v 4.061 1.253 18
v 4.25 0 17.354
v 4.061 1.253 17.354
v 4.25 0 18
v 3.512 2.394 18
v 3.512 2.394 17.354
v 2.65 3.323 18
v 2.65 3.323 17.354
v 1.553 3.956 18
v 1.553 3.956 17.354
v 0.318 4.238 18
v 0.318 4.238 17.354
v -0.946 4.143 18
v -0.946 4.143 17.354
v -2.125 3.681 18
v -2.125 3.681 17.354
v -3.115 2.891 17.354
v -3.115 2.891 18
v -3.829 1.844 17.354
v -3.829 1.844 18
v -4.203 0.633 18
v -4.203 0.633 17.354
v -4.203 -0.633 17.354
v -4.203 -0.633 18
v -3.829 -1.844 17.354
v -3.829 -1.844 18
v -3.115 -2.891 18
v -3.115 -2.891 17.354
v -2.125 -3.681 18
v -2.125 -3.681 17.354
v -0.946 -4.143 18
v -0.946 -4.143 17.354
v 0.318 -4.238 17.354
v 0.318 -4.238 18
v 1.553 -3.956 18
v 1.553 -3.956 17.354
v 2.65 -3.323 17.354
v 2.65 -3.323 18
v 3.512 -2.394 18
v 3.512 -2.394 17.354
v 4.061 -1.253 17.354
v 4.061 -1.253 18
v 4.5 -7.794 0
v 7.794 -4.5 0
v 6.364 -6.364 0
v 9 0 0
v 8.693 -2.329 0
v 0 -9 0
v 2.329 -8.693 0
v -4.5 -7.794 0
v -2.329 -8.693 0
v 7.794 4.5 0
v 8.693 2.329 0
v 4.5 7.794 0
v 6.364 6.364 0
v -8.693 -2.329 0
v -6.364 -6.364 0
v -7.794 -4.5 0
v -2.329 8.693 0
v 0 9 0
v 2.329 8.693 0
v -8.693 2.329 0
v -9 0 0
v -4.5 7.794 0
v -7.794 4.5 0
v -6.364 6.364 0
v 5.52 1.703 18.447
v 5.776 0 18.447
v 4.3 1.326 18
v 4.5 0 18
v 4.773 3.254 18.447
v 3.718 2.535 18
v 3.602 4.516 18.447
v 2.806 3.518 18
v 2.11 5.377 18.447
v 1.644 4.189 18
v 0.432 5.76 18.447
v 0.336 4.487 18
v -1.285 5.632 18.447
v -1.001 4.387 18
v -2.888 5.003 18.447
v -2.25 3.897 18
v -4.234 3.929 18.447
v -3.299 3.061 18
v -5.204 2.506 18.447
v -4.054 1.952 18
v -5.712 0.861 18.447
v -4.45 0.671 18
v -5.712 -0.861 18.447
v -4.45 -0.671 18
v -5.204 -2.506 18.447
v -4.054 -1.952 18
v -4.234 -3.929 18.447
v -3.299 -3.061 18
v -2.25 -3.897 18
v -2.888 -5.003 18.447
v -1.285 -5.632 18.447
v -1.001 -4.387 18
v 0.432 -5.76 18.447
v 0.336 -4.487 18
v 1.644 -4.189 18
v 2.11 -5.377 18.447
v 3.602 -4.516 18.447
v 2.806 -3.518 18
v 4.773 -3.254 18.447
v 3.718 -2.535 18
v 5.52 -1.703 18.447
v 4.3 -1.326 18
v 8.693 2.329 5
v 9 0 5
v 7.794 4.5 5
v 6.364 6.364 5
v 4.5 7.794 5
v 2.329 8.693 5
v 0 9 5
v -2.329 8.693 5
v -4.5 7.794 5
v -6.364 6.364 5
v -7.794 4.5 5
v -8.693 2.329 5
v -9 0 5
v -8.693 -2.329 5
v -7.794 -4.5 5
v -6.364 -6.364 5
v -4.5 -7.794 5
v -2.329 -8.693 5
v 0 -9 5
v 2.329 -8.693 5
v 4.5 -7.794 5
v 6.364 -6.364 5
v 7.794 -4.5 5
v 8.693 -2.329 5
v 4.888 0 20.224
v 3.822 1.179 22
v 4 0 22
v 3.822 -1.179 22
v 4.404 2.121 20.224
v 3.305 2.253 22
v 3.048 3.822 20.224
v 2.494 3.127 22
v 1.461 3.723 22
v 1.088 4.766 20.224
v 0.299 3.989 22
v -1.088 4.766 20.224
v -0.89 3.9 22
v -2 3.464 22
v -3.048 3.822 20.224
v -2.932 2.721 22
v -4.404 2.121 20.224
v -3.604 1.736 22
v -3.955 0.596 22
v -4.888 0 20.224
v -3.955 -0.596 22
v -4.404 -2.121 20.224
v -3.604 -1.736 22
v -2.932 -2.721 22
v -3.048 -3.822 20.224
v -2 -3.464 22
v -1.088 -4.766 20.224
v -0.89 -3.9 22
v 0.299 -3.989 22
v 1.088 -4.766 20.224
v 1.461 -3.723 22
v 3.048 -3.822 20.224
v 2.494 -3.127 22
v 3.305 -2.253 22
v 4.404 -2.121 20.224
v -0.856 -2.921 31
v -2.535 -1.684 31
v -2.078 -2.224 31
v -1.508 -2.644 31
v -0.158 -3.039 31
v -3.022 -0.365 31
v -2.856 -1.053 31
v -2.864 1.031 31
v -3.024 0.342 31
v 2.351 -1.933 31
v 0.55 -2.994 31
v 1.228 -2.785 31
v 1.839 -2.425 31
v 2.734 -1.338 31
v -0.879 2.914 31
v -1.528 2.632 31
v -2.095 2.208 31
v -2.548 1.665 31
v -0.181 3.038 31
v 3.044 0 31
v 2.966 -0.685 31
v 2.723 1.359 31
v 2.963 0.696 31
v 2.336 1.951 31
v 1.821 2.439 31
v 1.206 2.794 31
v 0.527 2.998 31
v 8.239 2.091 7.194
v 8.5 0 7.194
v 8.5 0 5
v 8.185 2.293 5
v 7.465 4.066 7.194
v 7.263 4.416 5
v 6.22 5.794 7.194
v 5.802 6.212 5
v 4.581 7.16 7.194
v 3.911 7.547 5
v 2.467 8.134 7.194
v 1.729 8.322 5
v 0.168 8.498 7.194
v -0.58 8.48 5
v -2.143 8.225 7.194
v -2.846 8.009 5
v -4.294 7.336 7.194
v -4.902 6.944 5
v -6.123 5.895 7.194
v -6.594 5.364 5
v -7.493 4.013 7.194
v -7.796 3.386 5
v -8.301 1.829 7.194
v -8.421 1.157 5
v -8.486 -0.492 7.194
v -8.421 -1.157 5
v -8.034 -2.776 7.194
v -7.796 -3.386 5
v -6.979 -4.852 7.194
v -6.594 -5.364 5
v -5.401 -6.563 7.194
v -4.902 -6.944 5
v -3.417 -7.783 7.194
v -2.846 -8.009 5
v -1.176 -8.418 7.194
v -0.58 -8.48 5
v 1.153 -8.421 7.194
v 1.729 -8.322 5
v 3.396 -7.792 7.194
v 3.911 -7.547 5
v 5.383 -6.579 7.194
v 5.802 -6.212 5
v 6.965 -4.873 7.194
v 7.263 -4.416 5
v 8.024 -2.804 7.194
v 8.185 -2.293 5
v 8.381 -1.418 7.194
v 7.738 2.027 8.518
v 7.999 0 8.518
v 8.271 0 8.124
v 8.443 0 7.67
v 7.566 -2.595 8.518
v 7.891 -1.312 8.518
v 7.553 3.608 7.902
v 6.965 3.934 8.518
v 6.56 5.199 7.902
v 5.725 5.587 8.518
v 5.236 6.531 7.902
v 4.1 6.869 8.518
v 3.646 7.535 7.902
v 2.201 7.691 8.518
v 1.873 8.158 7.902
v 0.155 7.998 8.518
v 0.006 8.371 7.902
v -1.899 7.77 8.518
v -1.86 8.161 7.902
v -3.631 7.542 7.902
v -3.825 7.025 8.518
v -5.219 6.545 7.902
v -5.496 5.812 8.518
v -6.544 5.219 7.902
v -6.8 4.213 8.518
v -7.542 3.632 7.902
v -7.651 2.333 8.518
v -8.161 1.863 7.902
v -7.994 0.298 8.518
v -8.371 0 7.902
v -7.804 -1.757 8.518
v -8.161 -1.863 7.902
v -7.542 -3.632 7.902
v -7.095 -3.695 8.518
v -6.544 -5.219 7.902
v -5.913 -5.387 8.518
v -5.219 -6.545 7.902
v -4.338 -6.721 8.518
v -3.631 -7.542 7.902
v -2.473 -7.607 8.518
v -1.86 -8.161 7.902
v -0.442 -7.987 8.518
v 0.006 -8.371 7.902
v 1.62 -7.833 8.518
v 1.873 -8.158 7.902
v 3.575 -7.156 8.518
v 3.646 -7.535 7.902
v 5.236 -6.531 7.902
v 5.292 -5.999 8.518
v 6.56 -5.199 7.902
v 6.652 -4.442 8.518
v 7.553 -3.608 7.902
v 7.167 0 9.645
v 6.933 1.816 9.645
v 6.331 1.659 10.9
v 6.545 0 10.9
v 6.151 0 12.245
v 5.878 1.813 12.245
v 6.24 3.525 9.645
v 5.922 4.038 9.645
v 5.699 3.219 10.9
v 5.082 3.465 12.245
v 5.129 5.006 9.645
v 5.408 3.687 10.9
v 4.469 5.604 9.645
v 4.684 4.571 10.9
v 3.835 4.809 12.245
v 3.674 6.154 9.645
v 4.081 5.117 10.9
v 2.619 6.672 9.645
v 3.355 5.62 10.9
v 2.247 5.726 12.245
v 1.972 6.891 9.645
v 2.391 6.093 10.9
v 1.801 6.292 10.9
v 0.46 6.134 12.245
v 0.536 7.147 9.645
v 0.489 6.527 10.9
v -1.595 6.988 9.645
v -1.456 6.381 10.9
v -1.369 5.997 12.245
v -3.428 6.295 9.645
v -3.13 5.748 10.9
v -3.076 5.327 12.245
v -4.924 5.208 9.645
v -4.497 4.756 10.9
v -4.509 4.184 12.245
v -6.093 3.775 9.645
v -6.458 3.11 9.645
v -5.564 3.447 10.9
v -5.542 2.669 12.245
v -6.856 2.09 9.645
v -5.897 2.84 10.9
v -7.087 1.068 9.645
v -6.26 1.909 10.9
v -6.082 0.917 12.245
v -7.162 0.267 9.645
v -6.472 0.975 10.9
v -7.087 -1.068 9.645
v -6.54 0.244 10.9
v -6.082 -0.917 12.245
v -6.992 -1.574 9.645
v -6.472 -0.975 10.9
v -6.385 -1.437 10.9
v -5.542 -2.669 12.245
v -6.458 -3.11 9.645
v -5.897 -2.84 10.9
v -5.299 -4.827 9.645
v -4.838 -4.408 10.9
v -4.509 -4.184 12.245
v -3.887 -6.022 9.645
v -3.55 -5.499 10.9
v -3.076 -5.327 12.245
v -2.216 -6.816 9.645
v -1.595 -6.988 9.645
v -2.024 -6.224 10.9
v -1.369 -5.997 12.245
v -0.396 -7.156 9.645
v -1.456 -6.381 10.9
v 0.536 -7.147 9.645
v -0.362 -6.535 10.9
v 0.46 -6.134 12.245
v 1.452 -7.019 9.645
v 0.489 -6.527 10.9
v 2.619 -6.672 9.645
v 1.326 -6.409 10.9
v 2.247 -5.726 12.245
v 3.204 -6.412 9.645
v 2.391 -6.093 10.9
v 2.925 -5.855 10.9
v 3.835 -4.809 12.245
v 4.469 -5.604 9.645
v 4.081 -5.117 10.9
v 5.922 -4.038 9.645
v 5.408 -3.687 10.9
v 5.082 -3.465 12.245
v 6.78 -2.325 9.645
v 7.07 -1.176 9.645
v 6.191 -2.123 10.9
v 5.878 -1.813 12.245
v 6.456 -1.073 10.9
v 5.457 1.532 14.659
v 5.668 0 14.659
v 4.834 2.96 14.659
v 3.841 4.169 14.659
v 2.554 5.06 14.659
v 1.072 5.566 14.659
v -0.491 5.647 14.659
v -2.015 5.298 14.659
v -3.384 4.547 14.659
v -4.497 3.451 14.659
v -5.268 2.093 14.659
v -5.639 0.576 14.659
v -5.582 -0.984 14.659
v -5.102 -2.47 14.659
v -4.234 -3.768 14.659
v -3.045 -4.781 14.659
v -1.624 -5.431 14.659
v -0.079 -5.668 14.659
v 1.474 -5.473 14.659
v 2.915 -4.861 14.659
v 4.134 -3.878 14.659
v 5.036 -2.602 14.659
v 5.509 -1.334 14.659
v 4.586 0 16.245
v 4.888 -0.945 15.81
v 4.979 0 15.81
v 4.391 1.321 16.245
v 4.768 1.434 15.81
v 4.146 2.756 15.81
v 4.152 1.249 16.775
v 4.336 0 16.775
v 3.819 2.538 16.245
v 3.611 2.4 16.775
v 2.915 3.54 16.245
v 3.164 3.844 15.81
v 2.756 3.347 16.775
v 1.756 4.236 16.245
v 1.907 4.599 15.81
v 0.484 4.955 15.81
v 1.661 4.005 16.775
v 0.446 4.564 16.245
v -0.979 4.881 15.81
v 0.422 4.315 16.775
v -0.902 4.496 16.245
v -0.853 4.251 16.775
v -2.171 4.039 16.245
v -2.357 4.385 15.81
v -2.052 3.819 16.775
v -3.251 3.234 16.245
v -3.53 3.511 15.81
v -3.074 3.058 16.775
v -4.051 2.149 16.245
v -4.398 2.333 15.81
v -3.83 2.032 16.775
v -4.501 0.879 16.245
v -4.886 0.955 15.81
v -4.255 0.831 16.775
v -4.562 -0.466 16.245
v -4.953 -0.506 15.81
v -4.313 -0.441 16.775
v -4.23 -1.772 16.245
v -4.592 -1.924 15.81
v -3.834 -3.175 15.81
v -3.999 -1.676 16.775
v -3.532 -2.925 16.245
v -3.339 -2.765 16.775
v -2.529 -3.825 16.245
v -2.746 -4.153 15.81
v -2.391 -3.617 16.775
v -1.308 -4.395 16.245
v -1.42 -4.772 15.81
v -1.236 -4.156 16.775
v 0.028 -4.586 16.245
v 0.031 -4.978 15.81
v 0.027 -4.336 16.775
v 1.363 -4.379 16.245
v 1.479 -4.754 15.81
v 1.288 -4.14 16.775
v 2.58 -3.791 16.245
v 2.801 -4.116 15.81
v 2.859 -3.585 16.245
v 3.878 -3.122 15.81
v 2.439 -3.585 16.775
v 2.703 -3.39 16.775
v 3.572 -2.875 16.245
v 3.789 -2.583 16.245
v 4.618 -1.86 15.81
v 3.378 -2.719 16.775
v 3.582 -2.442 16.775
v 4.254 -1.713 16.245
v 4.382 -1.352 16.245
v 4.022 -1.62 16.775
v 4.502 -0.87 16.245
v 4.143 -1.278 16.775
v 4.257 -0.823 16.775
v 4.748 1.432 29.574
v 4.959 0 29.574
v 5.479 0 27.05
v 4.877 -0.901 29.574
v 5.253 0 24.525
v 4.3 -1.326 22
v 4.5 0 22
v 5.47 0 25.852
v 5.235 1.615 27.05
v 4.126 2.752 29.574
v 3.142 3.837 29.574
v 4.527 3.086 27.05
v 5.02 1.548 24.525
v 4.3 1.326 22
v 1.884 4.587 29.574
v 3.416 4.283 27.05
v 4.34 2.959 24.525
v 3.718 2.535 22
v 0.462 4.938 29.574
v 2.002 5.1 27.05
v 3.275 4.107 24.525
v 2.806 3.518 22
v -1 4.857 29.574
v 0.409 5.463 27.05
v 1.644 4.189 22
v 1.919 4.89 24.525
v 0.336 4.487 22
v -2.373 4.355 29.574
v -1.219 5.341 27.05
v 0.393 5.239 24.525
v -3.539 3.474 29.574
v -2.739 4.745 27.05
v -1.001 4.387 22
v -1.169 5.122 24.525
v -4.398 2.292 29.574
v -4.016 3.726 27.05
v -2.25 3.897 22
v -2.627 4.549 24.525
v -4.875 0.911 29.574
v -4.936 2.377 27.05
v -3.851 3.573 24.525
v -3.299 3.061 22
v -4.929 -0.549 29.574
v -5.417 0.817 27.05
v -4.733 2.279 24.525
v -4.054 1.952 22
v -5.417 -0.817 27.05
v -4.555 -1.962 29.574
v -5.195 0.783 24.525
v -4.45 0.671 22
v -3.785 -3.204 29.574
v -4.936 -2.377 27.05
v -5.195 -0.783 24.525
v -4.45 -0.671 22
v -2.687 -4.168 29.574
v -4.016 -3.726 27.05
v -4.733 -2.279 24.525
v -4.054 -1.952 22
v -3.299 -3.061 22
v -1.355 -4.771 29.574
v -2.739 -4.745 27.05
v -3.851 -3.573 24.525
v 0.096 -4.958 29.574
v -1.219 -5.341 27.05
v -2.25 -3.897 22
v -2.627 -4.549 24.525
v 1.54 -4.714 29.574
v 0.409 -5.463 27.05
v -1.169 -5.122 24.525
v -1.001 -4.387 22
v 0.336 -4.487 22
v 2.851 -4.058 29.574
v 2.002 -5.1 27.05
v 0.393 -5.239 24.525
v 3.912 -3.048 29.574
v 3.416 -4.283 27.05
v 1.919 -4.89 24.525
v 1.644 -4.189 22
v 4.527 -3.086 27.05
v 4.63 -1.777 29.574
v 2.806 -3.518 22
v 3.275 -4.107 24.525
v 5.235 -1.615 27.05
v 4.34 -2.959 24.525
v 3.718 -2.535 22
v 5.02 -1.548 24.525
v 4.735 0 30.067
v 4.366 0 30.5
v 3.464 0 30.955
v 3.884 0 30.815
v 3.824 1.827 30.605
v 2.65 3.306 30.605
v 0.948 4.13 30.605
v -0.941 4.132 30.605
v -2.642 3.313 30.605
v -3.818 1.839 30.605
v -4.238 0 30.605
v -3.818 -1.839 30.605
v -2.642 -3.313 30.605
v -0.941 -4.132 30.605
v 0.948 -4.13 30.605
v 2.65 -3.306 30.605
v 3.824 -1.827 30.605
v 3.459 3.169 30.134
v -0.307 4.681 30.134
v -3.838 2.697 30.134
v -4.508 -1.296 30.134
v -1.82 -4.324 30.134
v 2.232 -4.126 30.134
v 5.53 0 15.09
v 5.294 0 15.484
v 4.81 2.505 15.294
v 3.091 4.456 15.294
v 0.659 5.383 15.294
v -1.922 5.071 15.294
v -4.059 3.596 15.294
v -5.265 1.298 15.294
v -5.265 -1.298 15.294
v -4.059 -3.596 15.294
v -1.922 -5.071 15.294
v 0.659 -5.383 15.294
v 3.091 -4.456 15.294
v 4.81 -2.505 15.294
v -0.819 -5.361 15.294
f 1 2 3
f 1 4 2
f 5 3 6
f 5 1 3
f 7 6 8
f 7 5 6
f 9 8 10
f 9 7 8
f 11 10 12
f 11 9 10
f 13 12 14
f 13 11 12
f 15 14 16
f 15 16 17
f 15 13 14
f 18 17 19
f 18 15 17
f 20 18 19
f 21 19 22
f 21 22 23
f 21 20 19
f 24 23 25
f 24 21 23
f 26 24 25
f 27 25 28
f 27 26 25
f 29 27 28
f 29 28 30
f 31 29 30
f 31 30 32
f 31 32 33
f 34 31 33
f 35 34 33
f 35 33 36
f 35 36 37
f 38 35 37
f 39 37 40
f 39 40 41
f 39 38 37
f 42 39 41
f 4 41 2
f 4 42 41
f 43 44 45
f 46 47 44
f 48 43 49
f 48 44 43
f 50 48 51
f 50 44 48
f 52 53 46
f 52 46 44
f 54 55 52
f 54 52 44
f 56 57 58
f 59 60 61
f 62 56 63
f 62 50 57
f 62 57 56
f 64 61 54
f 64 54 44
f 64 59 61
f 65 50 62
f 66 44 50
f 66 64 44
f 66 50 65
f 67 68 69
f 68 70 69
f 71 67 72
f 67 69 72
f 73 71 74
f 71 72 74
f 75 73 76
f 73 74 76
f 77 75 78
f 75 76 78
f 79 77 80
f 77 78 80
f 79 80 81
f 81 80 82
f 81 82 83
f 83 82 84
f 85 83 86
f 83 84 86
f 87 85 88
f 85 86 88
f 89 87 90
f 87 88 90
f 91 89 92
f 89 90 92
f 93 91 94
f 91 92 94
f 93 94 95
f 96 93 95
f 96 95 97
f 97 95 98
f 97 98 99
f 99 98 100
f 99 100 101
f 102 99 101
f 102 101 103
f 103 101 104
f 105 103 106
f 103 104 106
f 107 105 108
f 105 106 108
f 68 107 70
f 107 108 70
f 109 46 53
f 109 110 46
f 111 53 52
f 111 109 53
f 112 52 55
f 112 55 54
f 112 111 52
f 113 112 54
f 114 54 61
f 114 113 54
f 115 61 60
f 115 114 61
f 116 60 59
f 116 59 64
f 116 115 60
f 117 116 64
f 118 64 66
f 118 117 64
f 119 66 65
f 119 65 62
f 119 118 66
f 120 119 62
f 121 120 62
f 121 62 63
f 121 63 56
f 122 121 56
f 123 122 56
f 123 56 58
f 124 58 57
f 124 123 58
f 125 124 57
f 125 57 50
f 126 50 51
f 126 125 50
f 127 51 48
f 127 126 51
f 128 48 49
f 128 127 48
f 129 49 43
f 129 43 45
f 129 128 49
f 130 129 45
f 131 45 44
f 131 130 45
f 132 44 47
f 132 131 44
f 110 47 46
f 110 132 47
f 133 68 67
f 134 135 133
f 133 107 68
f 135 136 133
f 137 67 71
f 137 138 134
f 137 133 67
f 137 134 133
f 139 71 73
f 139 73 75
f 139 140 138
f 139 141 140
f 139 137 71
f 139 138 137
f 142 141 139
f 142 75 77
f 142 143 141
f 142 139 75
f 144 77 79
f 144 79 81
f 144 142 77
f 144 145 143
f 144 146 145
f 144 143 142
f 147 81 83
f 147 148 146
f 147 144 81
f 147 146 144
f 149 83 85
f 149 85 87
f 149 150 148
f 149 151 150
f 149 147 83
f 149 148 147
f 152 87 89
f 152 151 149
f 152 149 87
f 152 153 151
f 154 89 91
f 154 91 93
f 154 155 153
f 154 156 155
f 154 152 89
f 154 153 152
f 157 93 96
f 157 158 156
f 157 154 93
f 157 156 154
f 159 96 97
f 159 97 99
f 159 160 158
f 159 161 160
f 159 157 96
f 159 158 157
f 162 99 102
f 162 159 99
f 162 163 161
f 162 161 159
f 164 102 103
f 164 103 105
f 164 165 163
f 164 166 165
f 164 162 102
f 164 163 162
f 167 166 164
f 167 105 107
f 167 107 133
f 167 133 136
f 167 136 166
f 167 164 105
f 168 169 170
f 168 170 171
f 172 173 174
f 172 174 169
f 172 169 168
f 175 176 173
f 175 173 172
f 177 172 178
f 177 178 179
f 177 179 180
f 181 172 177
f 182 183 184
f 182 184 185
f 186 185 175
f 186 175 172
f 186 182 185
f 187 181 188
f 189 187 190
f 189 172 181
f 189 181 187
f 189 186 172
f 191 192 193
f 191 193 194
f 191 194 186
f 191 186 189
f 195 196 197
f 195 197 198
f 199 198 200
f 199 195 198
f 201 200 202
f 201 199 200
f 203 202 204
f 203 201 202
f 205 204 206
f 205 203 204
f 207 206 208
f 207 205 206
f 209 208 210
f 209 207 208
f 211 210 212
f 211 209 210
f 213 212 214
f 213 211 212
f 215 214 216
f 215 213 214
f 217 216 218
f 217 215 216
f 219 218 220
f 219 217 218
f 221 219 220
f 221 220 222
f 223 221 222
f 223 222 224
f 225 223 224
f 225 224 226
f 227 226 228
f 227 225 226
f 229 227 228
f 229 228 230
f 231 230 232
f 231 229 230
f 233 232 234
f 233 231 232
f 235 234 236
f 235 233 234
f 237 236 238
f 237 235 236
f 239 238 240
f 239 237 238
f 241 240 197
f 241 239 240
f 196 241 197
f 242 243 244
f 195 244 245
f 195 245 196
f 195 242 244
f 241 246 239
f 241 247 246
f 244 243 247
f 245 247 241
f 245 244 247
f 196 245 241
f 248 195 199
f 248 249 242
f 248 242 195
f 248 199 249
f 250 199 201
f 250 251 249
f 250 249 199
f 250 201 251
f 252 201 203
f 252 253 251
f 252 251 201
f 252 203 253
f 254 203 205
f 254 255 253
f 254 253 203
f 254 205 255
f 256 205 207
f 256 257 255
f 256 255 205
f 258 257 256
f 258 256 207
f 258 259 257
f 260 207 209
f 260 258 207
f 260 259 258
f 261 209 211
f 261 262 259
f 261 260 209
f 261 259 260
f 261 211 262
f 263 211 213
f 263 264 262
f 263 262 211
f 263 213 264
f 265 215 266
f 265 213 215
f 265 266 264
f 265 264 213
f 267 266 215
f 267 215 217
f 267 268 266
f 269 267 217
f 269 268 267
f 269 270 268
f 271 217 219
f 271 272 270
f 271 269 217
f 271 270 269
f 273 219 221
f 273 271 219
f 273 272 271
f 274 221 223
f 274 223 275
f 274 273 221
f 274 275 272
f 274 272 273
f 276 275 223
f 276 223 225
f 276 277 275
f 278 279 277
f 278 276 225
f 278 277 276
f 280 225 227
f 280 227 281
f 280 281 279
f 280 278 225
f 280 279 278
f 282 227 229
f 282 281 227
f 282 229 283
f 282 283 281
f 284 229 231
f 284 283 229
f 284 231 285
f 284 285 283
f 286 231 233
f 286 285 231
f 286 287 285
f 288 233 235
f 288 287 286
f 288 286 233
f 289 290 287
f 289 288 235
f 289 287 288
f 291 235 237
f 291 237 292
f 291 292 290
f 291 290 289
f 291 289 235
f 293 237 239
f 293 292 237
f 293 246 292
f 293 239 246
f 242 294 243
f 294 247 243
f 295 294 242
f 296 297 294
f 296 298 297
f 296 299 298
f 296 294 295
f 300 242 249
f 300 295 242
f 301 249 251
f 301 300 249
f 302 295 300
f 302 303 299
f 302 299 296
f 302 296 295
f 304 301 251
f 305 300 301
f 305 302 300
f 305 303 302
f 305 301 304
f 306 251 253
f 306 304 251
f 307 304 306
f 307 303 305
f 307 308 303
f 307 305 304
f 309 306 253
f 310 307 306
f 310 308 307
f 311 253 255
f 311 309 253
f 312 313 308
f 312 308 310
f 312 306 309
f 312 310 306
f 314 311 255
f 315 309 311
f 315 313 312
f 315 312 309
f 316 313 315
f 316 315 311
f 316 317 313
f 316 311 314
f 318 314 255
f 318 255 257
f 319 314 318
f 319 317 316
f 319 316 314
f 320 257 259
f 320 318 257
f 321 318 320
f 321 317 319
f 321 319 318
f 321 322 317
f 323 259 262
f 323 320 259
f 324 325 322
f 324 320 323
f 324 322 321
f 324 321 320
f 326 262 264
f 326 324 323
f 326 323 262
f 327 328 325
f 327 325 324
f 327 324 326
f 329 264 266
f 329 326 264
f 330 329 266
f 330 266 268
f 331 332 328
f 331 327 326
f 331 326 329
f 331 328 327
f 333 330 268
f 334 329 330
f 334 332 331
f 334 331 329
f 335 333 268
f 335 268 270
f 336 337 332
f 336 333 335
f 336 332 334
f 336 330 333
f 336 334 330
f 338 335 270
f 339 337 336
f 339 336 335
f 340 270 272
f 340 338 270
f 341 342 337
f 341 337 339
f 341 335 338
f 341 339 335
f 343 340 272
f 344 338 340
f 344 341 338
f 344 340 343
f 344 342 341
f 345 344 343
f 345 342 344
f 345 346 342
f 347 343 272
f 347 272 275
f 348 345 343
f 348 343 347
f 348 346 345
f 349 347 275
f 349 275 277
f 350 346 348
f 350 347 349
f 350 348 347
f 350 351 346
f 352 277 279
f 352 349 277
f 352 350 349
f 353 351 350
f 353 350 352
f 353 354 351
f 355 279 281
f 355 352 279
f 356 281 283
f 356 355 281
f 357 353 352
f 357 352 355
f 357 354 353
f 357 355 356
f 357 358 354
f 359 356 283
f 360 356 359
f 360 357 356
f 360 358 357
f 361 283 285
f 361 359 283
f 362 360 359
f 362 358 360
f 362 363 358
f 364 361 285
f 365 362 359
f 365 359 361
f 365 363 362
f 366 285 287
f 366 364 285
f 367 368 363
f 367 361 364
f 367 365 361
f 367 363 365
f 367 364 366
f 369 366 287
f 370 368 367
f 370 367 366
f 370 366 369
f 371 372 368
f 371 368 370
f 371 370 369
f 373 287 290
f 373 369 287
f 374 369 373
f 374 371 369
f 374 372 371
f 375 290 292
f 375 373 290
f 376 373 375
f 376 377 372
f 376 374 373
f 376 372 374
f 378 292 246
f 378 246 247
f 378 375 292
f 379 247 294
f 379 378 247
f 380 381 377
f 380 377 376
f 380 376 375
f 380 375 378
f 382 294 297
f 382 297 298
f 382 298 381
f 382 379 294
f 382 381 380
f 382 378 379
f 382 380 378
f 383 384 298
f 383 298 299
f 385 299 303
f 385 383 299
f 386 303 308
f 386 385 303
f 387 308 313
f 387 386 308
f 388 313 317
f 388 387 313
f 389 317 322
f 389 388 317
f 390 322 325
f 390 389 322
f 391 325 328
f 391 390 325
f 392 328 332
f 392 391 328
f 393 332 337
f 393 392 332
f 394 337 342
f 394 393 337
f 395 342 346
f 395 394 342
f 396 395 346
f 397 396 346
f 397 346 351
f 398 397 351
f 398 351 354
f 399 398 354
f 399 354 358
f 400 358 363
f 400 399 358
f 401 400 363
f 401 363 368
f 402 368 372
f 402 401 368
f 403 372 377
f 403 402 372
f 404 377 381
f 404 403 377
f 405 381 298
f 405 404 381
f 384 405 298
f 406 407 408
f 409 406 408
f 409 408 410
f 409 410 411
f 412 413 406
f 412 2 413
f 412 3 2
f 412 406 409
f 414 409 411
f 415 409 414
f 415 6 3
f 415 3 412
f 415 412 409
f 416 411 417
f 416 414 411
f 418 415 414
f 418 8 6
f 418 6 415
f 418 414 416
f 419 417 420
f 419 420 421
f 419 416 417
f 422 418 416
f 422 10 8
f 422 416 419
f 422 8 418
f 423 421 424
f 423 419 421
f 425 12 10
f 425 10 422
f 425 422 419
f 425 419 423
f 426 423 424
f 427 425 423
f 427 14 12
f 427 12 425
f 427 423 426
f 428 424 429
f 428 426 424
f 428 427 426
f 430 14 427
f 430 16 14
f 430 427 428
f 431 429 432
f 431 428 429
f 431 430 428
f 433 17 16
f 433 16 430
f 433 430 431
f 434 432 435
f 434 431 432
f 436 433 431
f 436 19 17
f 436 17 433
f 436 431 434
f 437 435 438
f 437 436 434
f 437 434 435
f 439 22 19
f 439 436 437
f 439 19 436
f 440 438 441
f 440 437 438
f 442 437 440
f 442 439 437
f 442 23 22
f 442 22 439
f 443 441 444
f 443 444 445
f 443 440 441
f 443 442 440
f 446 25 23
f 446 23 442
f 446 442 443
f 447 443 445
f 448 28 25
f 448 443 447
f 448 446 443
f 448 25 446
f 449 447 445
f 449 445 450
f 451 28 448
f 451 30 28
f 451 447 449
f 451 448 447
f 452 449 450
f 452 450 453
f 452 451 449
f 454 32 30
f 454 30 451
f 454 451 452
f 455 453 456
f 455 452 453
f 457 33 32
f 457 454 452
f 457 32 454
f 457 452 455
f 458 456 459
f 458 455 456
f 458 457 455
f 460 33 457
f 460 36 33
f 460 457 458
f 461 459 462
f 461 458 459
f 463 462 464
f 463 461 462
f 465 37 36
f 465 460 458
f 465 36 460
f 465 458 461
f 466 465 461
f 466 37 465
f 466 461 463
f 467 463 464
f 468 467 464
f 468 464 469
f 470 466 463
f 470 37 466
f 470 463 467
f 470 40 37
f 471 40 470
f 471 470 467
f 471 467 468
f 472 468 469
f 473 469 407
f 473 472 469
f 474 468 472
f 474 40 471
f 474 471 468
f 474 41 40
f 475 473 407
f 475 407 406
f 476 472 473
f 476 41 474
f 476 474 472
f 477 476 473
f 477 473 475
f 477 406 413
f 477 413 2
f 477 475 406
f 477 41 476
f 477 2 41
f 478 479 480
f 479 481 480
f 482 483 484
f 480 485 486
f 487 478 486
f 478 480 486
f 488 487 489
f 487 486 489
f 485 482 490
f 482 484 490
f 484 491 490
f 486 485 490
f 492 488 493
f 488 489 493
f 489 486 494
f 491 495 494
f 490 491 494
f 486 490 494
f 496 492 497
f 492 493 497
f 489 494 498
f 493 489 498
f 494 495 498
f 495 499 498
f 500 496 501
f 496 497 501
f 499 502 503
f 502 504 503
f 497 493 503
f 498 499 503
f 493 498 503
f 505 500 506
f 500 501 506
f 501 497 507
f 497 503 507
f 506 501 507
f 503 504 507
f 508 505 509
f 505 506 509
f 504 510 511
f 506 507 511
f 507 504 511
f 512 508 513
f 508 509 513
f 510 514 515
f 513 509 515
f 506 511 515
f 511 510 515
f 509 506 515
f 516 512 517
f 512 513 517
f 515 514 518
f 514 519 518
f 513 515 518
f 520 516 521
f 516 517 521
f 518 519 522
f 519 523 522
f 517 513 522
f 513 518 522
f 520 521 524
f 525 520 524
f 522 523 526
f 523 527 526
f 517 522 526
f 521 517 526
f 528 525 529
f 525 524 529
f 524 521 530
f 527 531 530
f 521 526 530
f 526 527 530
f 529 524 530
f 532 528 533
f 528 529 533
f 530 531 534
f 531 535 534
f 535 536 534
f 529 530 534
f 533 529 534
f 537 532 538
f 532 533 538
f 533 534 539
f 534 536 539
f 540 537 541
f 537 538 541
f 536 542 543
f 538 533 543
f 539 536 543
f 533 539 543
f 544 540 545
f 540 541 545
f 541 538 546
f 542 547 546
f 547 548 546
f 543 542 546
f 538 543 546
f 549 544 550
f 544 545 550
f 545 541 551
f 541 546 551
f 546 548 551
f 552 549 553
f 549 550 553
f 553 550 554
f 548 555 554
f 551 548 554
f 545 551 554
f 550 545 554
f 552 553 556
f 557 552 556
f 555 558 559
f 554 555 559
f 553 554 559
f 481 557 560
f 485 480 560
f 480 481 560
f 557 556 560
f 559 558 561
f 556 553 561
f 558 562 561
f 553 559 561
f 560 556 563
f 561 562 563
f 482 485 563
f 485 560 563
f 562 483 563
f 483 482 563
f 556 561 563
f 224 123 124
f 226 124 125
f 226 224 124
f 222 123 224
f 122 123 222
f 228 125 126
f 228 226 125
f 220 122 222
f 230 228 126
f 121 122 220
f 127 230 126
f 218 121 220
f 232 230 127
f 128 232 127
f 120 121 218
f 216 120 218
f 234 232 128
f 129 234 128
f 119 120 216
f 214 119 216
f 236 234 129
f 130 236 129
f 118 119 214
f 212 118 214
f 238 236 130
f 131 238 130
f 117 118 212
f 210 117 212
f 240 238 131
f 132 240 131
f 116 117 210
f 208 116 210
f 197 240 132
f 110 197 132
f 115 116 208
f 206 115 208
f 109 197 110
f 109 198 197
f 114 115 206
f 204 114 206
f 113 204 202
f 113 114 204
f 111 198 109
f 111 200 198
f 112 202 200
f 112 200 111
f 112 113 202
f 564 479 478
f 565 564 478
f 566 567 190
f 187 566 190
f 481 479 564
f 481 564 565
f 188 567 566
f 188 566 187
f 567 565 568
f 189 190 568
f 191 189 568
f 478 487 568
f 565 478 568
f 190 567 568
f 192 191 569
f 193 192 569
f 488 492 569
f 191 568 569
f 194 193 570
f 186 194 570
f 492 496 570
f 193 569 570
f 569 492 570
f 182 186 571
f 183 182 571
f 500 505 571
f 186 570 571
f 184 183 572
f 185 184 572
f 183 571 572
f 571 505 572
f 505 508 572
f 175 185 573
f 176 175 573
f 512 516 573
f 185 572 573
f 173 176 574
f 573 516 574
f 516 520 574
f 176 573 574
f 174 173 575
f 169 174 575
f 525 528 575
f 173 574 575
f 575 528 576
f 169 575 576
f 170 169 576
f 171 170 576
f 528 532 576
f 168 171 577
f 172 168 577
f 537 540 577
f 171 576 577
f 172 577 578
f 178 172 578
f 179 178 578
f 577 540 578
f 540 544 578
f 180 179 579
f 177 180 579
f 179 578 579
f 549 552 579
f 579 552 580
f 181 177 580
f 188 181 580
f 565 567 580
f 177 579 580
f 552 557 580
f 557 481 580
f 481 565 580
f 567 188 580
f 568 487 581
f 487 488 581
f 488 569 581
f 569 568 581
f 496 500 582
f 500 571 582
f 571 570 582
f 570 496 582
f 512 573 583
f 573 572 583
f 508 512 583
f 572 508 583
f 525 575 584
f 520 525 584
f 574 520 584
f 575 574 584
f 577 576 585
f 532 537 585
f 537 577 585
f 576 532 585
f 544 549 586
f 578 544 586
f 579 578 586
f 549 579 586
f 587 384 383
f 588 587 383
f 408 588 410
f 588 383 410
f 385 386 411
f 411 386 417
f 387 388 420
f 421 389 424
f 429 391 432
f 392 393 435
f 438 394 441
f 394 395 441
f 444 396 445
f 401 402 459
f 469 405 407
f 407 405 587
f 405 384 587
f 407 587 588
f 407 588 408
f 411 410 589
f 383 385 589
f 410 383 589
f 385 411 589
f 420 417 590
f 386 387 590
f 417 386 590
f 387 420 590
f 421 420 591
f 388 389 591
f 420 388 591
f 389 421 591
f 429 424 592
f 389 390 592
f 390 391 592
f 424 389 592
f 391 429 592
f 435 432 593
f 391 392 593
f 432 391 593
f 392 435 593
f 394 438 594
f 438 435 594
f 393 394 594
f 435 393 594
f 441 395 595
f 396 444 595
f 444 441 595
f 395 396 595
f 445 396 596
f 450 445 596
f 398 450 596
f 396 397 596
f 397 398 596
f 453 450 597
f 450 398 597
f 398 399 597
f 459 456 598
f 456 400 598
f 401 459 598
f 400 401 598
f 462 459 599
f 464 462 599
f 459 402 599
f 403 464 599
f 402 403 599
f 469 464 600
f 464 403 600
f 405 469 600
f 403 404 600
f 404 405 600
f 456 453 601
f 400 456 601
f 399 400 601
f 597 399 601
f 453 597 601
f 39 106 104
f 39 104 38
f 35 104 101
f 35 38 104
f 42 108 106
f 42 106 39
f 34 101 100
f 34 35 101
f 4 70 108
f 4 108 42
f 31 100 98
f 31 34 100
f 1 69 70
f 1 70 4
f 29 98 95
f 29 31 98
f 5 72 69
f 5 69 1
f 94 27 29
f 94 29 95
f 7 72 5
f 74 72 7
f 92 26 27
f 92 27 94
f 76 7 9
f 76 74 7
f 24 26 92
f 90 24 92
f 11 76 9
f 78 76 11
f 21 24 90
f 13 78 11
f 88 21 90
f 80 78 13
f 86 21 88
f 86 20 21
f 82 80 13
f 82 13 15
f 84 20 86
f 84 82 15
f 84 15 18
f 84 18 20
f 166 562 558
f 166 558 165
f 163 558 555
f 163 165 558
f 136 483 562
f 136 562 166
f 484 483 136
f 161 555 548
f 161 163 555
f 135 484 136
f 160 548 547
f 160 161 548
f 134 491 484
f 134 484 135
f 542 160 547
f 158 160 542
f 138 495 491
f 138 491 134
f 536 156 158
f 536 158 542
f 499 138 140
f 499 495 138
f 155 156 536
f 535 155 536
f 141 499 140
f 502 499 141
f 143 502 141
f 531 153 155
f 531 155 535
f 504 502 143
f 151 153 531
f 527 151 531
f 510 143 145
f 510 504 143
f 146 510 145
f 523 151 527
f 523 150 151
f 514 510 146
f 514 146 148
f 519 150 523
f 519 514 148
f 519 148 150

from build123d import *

# Parameters (mm, degrees)
F4_R = 2
F5_R = 2
F6_R = 2


# Not quite as in the source:
# - a fillet or chamfer that OpenCascade refuses, or shapes differently, is made with other operations: its cross-section is extruded or revolved along the edge and cut away or added


with BuildPart() as f1:
    # F0 (on Front) → F1 (revolve)
    with BuildSketch(Plane.XZ):
        with BuildLine():
            Line((0, 31), (0, 0))
            Line((0, 0), (9, 0))
            Line((9, 0), (9, 5))
            Line((9, 5), (8.5, 5))
            Line((8.5, 5), (8.5, 8))
            Line((8.5, 8), (7, 8))
            Line((7, 8), (5.5, 15.5))
            Line((5.5, 15.5), (4.25, 15.5))
            Line((4.25, 15.5), (4.25, 18))
            Line((4.25, 18), (6, 18))
            Line((6, 18), (4, 22))
            Line((4, 22), (4.5, 22))
            add(Edge.make_bspline(
                [(4.5, 31), (5, 29.5), (6, 26.5), (5, 23.5), (4.5, 22)],
                knots=[0, 0, 0, 0, 0.5, 1, 1, 1, 1], degree=3))
            Line((4.5, 31), (0, 31))
        make_face()
    revolve(axis=Axis((0, 0, 15.5), (0, 0, 1)))

    # F2: fillet of radius 2 on 1 edges, made by hand

    # F2_s1 → F2_t2 (revolve)
    with BuildSketch(Plane.XZ):
        with BuildLine():
            ThreePointArc((5.5, 15.5), (4.5916876048, 16.236015633), (4.25, 17.3540496218))
            Line((4.25, 17.3540496218), (4.25, 15.5))
            Line((4.25, 15.5), (5.5, 15.5))
        make_face()
    revolve(axis=Axis((0, 0, 15.5), (0, 0, 1)))

    # F3: fillet of radius 8 on 1 edges, made by hand

    # F3_s1 → F3_t2 (revolve)
    with BuildSketch(Plane.XZ):
        with BuildLine():
            ThreePointArc((8.5, 8), (6.9960478639, 9.9399549841), (6.1510825053, 12.2445874734))
            Line((6.1510825053, 12.2445874734), (5.9941895972, 12.2132088918))
            Line((5.9941895972, 12.2132088918), (6.8431070919, 7.9686214184))
            Line((6.8431070919, 7.9686214184), (7, 7.84))
            ThreePointArc((7, 7.84), (7.75, 7.84), (8.3900854418, 7.8837296689))
            Line((8.3900854418, 7.8837296689), (8.5, 8))
        make_face()
    revolve(axis=Axis((0, 0, 8), (0, 0, 1)))

    # F4
    f4_edges = [f1.edges().sort_by_distance(p)[0] for p in [
        (-5.5, 0, 15.5),
    ]]
    fillet(f4_edges, radius=F4_R)

    # F5
    f5_edges = [f1.edges().sort_by_distance(p)[0] for p in [
        (-8.5, 0, 8),
    ]]
    fillet(f5_edges, radius=F5_R)

    # F6
    f6_edges = [f1.edges().sort_by_distance(p)[0] for p in [
        (-4.5, 0, 31),
    ]]
    fillet(f6_edges, radius=F6_R)

    # F7: chamfer of 1.5 x 0.5 on 1 edges, made by hand

    # F7_s1 → F7_t2 (revolve, cut)
    with BuildSketch(Plane.XZ):
        Polygon((5.7763932023, 18.4472135955), (4.5, 18), (6, 18), align=None)
    revolve(axis=Axis((0, 0, 18), (0, 0, 1)), mode=Mode.SUBTRACT)


solid = f1.part
